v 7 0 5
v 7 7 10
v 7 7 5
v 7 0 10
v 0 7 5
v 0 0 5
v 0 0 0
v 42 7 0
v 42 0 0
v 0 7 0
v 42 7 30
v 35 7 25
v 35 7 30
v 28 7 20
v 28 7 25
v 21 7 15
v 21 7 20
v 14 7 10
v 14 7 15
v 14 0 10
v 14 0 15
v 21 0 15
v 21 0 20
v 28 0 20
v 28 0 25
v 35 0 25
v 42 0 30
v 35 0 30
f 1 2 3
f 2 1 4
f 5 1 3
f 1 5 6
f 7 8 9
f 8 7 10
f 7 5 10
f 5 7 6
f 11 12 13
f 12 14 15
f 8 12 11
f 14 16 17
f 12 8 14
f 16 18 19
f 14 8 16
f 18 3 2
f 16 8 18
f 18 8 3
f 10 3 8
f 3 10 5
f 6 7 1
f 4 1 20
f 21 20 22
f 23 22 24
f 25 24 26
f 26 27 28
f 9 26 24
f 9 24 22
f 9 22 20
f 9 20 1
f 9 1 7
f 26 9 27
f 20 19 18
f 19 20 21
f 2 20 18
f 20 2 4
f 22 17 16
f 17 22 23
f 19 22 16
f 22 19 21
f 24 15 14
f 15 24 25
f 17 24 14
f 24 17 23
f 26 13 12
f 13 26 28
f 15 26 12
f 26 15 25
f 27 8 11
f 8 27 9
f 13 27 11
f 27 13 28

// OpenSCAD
sz=7;
hstep=5;

for (i=[1:6])
{
    translate([(i-1)*sz,0,0])
    cube([sz,sz,hstep*i]);
}
